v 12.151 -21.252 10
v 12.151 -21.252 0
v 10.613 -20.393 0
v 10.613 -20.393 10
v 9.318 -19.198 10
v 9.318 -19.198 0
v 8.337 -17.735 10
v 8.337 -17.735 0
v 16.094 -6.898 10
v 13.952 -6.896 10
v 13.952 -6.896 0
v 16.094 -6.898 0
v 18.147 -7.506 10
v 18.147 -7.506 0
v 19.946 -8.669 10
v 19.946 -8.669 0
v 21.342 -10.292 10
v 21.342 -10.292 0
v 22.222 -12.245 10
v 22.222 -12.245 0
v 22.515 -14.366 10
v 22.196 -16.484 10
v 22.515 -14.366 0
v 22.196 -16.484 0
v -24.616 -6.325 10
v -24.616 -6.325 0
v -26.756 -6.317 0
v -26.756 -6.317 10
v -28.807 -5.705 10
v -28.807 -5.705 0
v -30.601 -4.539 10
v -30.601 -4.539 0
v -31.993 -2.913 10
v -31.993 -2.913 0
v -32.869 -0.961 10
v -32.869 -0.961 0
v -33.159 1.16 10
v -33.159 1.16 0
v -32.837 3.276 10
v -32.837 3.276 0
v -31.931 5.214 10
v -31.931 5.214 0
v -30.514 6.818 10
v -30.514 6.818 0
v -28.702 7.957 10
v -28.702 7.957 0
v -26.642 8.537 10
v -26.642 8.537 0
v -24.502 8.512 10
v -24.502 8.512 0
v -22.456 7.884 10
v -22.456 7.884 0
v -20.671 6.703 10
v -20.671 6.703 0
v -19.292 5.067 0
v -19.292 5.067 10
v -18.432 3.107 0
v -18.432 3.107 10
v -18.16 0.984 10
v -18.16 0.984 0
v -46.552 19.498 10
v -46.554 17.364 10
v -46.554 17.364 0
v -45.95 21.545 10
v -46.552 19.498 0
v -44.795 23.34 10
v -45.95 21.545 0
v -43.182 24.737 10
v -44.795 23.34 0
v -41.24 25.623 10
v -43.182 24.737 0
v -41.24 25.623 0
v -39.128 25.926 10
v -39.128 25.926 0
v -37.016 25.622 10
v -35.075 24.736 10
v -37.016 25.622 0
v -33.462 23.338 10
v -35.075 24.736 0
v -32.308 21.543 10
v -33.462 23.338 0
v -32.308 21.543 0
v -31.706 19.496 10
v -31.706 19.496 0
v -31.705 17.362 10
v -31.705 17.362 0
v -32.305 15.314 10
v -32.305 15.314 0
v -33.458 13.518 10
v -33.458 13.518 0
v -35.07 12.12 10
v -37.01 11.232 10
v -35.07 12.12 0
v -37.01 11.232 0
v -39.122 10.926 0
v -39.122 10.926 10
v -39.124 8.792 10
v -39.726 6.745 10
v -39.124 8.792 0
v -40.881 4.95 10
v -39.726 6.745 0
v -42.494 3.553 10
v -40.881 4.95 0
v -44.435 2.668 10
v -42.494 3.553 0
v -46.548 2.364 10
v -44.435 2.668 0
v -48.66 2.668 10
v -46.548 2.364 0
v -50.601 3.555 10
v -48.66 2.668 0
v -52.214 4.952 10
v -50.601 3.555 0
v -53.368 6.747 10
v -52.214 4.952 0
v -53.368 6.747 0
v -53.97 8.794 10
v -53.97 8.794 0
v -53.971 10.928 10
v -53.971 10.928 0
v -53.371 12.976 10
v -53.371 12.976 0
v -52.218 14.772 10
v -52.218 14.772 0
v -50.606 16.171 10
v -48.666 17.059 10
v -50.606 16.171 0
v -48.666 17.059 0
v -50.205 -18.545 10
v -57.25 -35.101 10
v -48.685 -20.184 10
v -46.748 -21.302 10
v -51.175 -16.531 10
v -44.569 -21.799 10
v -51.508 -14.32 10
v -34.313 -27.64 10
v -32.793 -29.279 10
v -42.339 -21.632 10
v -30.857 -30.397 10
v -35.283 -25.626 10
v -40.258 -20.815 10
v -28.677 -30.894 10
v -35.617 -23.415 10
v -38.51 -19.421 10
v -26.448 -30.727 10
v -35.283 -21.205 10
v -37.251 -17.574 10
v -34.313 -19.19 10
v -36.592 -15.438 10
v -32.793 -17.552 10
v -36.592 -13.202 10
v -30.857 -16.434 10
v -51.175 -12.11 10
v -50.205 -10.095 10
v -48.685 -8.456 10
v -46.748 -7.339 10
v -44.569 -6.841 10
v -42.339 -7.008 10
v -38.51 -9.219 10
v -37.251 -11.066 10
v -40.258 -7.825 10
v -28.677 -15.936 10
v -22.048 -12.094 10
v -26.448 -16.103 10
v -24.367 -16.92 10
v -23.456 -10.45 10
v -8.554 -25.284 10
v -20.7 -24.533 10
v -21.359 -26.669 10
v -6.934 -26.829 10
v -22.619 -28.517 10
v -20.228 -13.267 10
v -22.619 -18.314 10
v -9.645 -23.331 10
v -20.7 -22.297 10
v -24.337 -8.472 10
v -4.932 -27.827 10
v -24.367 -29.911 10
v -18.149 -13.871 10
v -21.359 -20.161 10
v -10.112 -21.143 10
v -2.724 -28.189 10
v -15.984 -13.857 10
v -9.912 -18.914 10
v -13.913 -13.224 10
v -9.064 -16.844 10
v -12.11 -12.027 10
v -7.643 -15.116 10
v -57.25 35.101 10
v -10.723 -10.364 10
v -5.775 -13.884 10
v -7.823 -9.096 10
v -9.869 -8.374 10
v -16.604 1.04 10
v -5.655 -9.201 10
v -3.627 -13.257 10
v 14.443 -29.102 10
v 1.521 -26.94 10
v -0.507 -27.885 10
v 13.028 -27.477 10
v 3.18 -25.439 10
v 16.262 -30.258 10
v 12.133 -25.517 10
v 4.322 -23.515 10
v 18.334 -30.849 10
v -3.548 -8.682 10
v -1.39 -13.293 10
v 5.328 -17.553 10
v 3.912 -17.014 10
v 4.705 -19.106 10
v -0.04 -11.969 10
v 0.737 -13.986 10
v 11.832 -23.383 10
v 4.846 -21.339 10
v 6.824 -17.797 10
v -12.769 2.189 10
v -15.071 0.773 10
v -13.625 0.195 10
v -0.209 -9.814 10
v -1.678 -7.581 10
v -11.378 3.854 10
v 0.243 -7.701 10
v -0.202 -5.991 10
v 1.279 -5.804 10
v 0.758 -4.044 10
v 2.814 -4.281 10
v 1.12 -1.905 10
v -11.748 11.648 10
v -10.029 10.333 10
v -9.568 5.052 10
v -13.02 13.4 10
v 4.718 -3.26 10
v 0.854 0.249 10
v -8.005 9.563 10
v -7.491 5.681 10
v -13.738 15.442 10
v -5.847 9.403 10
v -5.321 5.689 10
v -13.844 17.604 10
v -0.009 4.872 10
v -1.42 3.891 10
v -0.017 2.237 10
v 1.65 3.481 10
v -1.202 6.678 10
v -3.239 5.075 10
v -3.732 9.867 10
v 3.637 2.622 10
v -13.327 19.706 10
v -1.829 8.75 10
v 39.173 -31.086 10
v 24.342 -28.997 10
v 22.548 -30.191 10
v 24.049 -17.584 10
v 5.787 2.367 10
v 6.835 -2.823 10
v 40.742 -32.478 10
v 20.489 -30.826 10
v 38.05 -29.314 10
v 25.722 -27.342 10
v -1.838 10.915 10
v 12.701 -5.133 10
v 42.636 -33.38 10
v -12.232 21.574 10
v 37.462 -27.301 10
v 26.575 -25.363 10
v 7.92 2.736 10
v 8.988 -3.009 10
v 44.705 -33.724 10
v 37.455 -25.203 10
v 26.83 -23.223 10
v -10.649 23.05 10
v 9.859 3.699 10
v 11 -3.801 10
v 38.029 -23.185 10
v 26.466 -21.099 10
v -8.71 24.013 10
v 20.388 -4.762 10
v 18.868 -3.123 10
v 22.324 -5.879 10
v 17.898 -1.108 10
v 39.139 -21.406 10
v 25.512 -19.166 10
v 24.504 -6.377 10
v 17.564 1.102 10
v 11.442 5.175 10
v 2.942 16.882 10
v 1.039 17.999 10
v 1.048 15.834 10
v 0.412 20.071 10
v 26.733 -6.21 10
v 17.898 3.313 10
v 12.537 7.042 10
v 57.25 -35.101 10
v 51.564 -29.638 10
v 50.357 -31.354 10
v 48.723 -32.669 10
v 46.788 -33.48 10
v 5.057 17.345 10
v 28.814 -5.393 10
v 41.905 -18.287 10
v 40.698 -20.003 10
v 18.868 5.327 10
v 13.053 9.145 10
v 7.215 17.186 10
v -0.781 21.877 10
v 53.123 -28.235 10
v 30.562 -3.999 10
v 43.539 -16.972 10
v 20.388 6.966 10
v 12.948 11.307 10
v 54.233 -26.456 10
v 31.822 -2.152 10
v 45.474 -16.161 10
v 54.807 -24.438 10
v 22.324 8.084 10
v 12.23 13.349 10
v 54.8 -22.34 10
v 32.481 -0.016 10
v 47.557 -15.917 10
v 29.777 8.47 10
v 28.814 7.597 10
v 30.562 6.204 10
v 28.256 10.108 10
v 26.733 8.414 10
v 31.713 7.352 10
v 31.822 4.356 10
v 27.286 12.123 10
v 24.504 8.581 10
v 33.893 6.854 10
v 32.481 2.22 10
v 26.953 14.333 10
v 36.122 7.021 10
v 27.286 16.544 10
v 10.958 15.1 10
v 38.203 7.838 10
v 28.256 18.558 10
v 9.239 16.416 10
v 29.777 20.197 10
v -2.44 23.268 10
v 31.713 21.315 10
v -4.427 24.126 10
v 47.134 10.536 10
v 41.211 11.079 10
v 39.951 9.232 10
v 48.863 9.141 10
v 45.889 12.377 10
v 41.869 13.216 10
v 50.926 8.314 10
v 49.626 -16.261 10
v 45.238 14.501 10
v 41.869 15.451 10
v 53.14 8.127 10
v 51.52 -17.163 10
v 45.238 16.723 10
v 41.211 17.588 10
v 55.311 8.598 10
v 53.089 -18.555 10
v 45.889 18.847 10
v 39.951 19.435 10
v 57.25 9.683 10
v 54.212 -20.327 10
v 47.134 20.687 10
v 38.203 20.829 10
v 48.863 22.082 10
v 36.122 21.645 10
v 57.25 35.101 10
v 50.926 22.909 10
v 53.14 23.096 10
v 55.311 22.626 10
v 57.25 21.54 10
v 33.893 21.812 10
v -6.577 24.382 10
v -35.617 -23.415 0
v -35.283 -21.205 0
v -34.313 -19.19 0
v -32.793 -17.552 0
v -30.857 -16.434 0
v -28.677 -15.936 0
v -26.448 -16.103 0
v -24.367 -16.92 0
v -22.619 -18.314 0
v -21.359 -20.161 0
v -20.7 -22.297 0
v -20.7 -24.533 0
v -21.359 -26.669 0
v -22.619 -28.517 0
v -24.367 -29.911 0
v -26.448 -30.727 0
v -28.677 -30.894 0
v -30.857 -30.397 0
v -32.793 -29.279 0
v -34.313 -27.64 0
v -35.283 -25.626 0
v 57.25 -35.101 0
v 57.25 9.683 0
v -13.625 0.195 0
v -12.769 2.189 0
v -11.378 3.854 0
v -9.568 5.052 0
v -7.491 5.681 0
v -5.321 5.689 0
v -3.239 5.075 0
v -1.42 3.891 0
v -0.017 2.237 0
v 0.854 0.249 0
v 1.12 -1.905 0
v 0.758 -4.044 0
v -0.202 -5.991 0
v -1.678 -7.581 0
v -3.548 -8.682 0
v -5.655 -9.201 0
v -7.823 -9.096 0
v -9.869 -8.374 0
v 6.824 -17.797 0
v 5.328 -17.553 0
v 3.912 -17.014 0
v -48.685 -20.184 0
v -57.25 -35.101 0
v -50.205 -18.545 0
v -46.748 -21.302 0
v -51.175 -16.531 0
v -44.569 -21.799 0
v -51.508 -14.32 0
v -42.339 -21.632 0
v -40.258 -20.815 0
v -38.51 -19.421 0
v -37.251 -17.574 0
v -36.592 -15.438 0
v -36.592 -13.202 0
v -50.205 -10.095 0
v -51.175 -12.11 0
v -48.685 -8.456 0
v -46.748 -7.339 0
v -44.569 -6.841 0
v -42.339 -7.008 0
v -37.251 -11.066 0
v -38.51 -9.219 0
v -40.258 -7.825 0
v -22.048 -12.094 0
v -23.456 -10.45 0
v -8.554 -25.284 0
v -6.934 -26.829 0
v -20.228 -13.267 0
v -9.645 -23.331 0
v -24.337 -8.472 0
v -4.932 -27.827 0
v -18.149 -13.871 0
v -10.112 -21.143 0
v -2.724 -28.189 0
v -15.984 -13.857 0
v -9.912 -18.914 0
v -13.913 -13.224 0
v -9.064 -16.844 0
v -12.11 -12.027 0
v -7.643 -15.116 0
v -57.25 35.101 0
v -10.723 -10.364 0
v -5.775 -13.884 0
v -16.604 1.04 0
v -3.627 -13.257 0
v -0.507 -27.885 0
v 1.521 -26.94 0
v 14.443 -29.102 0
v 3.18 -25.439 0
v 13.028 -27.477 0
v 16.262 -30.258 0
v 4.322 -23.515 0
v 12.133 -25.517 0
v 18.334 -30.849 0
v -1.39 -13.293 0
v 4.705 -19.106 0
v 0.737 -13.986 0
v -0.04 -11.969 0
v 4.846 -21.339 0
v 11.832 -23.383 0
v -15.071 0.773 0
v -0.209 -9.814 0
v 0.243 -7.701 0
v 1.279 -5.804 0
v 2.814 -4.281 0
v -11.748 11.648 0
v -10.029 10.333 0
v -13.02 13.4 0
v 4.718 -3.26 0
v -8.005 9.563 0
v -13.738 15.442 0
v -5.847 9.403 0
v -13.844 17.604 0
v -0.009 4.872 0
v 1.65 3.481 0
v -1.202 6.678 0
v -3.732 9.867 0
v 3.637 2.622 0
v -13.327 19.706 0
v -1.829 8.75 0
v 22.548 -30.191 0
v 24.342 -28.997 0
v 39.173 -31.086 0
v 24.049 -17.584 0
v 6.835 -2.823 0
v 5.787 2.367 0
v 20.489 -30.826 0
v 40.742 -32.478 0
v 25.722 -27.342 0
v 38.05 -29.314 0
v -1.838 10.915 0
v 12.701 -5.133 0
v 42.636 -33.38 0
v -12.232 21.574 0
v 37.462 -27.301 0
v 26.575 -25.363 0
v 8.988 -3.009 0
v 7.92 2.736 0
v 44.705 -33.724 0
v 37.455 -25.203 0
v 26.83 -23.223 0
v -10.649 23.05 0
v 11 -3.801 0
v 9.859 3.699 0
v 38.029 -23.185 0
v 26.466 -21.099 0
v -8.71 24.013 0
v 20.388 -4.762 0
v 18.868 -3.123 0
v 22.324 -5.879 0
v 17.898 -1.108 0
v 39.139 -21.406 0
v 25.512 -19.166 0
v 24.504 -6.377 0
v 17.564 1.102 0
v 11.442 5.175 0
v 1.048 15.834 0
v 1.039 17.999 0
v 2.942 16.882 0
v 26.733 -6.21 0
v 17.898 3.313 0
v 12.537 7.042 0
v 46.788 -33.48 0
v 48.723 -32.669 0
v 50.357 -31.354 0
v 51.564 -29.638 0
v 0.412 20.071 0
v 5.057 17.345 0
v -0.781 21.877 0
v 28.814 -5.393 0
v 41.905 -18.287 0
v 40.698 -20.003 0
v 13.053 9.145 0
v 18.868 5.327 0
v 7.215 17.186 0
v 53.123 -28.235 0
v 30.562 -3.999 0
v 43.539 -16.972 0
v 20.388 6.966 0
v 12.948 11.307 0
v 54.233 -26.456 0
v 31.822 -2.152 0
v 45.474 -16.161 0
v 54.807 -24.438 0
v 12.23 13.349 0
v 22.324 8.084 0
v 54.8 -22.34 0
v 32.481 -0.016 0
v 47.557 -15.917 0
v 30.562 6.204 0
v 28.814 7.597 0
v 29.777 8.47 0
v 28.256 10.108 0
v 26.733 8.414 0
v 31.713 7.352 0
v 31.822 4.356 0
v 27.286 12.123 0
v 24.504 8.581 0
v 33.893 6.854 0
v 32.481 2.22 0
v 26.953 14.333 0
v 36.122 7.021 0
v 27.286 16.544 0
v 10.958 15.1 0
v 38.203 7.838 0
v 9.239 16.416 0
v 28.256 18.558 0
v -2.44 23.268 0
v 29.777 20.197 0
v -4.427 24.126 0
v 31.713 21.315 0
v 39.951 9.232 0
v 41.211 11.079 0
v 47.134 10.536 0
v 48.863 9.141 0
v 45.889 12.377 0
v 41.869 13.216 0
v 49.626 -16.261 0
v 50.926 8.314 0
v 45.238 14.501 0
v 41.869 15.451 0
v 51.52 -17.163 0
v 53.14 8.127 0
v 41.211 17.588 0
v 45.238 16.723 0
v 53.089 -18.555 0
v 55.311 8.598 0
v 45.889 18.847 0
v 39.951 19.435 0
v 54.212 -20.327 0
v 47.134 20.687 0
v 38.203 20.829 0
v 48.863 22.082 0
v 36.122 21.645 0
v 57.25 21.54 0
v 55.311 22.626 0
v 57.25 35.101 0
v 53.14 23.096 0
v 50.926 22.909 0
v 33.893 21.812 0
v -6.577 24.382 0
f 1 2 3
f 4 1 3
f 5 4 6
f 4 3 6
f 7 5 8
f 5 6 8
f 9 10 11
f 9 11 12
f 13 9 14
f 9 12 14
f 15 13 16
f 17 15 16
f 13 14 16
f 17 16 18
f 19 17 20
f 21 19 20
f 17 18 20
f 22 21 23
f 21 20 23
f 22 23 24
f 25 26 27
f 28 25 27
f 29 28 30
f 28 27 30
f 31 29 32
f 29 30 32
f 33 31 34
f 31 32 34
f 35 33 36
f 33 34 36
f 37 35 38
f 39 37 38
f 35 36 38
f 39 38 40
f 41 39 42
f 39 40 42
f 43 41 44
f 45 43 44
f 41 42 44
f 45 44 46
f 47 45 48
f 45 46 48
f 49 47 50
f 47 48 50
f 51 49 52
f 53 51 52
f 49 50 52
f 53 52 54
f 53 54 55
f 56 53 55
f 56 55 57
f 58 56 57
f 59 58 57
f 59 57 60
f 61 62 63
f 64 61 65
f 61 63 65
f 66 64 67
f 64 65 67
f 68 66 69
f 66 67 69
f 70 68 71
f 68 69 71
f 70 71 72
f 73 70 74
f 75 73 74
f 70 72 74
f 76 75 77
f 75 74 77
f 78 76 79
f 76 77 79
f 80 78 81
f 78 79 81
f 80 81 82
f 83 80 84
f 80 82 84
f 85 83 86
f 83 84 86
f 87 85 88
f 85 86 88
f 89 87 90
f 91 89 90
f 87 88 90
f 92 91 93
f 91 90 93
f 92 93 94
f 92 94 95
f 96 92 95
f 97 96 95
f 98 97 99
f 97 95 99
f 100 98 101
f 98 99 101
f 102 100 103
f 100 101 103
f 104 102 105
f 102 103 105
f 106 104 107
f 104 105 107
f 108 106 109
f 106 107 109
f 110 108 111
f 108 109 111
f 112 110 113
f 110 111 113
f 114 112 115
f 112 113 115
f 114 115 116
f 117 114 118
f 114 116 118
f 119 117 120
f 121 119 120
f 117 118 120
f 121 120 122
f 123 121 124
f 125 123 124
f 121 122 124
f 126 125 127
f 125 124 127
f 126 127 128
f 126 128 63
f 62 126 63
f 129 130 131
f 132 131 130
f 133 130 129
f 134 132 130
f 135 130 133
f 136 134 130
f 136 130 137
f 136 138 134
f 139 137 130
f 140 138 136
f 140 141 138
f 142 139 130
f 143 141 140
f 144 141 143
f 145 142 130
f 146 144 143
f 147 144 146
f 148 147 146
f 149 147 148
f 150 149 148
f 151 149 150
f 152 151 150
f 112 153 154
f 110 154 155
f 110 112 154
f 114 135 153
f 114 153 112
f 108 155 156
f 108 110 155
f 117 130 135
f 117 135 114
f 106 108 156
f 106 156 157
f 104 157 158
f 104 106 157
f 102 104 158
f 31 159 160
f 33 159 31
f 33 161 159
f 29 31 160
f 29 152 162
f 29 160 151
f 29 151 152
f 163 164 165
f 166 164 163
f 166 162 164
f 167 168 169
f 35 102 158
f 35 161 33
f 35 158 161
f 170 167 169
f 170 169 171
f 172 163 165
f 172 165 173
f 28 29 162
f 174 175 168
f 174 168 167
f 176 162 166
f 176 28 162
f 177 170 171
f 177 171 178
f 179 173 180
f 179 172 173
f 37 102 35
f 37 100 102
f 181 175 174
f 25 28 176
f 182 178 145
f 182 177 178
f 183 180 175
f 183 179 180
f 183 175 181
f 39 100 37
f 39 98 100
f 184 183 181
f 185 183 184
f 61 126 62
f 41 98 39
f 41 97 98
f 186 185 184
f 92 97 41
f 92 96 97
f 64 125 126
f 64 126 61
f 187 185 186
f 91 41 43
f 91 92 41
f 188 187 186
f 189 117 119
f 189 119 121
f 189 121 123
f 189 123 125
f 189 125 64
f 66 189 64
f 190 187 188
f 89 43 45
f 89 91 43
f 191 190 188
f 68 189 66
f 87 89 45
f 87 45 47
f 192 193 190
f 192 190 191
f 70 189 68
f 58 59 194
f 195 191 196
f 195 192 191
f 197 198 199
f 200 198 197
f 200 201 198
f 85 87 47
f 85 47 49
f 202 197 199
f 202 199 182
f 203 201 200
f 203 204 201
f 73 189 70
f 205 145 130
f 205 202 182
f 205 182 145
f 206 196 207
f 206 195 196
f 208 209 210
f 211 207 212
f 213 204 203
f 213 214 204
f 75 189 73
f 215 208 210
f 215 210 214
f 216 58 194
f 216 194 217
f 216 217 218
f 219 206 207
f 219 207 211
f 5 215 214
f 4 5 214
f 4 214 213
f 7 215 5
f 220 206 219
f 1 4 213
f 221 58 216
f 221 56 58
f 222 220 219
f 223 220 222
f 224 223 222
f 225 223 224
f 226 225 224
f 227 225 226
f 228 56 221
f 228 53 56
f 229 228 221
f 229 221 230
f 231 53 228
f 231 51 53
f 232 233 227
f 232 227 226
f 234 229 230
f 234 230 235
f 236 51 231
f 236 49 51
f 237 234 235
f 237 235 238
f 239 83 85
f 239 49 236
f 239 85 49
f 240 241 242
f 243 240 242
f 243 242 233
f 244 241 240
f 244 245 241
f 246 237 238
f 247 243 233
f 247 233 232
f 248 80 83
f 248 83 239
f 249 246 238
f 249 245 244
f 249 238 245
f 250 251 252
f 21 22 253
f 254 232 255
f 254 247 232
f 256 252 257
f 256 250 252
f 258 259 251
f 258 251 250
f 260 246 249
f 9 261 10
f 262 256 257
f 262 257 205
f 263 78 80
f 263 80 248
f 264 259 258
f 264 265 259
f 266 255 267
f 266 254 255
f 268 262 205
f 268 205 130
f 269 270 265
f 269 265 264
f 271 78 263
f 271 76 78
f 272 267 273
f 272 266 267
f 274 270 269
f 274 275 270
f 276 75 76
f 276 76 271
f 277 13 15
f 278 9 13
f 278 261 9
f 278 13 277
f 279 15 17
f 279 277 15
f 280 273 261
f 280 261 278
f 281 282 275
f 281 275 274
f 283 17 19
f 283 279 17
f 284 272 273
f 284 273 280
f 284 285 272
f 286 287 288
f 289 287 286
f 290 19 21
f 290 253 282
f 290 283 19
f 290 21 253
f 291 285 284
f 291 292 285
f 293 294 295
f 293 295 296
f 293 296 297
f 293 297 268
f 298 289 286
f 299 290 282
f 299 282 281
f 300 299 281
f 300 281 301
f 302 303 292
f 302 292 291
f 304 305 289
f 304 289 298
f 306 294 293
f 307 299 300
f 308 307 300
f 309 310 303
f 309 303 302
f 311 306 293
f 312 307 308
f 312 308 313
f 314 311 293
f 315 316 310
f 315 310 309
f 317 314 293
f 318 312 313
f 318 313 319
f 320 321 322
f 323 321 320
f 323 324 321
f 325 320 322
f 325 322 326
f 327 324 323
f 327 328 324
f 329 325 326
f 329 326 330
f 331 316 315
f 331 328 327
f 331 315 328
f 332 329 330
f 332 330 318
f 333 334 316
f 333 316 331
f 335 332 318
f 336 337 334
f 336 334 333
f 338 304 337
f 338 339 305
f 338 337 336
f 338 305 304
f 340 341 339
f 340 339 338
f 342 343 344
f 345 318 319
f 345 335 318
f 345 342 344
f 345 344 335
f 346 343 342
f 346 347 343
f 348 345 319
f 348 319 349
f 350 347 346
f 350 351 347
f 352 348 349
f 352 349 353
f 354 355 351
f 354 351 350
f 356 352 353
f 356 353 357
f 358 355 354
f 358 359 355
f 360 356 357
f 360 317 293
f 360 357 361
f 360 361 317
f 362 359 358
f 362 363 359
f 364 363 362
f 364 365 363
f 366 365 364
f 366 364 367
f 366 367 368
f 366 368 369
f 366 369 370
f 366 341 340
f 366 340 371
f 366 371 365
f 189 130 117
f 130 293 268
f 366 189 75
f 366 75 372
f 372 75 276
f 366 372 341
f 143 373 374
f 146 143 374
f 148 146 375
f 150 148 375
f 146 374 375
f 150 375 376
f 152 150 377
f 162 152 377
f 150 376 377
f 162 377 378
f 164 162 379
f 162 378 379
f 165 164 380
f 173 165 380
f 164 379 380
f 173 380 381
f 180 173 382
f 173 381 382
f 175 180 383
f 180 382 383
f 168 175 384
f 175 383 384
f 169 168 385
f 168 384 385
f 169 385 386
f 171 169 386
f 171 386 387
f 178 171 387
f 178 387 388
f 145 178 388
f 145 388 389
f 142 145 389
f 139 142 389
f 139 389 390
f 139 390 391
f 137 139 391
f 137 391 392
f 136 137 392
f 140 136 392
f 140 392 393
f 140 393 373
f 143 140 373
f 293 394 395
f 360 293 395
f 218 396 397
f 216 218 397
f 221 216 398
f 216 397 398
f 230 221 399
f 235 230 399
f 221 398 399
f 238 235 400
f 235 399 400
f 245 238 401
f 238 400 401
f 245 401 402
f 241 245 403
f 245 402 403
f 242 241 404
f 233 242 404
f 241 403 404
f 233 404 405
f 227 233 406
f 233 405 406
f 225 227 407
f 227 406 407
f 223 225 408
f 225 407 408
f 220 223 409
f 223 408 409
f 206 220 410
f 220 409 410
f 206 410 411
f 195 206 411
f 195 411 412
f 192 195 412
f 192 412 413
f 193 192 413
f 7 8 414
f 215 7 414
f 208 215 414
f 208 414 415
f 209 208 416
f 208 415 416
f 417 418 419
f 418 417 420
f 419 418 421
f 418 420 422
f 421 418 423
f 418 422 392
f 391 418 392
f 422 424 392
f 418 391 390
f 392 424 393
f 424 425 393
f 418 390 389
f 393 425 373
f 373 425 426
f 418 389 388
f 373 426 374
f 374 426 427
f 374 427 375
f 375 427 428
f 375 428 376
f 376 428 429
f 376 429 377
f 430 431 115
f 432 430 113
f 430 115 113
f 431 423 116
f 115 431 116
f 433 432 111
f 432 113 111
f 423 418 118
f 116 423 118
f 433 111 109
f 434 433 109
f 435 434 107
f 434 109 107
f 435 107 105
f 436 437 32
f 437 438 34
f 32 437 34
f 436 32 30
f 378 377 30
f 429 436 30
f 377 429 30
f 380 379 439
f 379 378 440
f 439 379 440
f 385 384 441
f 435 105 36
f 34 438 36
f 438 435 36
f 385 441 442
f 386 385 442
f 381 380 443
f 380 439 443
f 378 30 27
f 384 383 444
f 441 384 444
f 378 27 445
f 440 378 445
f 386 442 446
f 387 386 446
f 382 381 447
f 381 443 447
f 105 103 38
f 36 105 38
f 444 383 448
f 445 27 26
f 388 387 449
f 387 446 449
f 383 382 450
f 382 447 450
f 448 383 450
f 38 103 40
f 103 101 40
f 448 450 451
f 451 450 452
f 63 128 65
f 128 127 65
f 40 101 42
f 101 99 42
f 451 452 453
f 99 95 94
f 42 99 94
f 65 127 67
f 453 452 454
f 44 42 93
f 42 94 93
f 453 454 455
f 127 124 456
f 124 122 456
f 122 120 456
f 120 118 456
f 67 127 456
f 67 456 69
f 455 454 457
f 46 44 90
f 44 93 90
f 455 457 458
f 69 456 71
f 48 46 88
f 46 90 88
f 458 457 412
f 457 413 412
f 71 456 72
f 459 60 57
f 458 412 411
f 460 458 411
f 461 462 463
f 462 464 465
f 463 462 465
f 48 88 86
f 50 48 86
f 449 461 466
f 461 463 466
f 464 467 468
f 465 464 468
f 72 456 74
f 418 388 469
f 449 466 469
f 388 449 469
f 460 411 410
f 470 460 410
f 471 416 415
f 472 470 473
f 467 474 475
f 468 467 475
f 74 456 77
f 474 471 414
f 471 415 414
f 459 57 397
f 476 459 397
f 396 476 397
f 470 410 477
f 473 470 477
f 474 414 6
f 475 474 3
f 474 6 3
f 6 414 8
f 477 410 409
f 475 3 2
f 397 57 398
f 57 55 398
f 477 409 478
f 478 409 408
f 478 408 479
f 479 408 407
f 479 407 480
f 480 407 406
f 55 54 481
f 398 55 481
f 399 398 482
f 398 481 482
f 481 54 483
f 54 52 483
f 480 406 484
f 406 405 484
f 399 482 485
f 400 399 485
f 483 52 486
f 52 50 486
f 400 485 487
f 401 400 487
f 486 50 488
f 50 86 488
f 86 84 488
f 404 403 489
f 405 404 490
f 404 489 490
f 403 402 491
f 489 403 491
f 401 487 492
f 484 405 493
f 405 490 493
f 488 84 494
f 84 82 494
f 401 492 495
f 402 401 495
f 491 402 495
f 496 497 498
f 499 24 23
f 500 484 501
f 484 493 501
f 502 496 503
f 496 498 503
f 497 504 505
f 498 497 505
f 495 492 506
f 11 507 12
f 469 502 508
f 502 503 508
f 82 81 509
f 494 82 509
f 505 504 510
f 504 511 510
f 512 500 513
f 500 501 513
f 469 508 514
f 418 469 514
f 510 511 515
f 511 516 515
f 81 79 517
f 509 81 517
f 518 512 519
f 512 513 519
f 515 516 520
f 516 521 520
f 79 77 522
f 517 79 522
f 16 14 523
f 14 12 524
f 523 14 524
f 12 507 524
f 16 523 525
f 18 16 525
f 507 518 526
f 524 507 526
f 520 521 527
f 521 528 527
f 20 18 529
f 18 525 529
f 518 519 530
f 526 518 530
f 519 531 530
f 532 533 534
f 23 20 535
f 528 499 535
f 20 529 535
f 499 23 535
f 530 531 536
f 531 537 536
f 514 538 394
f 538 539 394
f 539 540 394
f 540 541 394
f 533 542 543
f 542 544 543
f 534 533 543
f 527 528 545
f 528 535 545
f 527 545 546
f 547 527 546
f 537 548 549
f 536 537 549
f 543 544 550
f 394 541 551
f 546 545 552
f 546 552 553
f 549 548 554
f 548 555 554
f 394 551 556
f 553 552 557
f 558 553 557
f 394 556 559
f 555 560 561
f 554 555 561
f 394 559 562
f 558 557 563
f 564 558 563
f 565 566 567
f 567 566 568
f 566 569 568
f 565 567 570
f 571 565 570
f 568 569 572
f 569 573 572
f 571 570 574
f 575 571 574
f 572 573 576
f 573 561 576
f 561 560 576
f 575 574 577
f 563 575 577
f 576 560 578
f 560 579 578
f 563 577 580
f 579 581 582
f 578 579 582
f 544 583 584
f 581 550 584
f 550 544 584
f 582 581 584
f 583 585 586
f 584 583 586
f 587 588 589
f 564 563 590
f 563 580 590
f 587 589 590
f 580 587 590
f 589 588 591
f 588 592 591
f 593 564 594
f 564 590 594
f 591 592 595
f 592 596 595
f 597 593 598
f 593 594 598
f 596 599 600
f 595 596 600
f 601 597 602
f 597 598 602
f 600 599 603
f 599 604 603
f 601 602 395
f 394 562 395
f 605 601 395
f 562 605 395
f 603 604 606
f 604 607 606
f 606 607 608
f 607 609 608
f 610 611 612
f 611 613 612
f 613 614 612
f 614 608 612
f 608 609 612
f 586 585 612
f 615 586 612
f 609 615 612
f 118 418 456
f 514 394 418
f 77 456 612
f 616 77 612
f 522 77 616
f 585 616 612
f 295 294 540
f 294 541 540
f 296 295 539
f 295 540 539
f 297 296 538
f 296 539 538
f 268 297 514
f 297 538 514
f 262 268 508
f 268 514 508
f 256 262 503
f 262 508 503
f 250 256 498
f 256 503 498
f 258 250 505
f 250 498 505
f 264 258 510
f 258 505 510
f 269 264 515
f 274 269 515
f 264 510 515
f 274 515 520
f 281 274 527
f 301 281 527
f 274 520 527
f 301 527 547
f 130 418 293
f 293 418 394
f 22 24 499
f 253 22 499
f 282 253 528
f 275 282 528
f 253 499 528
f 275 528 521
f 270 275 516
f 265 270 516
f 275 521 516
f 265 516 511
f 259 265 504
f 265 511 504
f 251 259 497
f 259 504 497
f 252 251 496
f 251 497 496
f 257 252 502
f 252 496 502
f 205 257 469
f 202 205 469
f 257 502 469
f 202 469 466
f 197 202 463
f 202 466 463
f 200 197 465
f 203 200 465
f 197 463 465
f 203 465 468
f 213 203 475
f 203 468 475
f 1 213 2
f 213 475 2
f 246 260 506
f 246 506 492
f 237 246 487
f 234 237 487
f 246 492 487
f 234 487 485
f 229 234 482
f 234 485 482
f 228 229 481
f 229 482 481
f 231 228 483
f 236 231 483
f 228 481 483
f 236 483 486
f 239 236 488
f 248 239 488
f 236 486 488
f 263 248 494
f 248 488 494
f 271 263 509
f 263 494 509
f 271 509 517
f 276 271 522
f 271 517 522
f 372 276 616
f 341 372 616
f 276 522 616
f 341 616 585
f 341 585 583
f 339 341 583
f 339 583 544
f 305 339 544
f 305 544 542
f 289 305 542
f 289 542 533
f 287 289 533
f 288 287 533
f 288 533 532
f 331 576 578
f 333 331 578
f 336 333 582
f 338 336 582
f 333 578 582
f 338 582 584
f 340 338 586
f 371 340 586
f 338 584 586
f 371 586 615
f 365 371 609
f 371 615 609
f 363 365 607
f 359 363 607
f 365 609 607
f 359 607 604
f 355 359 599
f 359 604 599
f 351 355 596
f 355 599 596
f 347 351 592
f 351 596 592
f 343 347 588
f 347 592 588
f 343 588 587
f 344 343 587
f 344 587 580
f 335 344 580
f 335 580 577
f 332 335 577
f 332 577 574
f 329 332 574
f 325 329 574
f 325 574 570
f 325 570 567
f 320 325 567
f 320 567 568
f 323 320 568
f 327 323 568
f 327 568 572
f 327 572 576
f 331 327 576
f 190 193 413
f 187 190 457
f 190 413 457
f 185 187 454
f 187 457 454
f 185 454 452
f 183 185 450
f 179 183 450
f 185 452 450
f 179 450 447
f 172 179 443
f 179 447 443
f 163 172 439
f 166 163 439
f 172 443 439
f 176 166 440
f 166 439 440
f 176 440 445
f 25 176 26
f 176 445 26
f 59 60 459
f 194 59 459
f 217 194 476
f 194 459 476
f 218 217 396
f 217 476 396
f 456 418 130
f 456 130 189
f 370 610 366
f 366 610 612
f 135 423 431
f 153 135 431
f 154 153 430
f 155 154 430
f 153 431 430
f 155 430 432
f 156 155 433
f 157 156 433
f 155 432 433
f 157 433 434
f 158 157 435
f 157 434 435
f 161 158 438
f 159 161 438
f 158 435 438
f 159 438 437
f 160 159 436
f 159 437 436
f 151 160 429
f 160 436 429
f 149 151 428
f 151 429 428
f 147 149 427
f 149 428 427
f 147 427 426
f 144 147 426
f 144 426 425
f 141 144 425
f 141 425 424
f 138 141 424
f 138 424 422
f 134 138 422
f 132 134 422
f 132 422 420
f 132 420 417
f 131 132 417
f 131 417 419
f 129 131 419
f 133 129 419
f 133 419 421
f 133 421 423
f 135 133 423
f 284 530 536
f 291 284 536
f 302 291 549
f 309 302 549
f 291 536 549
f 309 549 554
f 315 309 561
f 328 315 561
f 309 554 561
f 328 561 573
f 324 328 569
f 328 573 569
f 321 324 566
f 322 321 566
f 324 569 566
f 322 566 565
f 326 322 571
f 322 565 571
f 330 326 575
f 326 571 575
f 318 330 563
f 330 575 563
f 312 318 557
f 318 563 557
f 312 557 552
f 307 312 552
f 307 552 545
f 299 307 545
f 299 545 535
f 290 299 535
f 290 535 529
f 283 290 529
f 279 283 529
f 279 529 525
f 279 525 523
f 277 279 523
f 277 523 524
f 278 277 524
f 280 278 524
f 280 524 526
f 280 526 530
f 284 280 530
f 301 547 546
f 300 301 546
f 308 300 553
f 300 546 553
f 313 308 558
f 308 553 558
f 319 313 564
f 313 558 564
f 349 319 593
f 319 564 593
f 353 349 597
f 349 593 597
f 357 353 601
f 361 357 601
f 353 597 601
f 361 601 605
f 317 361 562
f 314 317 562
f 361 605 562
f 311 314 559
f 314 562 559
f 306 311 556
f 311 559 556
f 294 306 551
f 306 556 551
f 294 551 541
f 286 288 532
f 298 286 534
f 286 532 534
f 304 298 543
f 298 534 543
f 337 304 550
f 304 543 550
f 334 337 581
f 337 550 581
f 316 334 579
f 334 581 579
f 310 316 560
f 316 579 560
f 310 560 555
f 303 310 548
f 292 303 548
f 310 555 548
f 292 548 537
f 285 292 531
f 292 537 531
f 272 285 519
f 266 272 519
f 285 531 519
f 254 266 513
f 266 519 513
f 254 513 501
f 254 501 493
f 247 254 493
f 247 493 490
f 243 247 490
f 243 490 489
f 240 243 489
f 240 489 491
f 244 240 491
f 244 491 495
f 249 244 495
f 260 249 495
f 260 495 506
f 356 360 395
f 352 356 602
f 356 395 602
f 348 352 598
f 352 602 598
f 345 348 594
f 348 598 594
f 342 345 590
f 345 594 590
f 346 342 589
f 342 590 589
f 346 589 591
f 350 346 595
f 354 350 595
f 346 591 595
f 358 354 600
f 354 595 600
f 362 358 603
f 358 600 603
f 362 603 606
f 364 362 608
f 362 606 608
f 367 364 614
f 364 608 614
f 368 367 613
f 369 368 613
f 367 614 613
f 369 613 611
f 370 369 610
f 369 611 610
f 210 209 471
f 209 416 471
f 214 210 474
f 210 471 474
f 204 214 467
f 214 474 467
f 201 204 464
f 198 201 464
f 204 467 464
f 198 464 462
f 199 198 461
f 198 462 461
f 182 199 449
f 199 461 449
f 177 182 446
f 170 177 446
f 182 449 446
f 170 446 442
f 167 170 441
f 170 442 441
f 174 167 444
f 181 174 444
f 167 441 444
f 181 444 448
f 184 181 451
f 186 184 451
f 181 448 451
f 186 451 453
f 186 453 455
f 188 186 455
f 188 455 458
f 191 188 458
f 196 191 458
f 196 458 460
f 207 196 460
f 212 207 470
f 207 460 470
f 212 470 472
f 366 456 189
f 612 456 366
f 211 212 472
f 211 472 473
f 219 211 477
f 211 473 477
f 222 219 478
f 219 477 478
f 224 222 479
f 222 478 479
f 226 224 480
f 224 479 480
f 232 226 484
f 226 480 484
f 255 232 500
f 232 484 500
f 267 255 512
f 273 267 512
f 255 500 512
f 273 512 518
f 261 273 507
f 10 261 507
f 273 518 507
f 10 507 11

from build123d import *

# Parameters (mm, degrees)
SKICA1_W                 = 114.49904762
SKICA1_H                 = 70.201904762
P_IDAT_VYSUNUT_M1_DEPTH  = 10
ODEBRAT_VYSUNUT_M1_REACH = 69.894
SKICA2_R                 = 7.5


with BuildPart() as part:
    # Skica1 → Přidat vysunutím1 (new body)
    with BuildSketch(Plane.XY):
        Rectangle(SKICA1_W, SKICA1_H)
    extrude(amount=P_IDAT_VYSUNUT_M1_DEPTH)

    # Skica2 → Odebrat vysunutím1 (cut, up to next)
    with BuildSketch(Plane(origin=(0, 0, 0), x_dir=(-1, 0, 0), z_dir=(0, 0, -1)), mode=Mode.PRIVATE) as odebrat_vysunut_m1_sk1:
        with Locations((-44.884870965, -26.225697914)):
            Circle(SKICA2_R)
    odebrat_vysunut_m1_tool1 = extrude(odebrat_vysunut_m1_sk1.sketch, amount=-ODEBRAT_VYSUNUT_M1_REACH, mode=Mode.PRIVATE) & part.part
    odebrat_vysunut_m1 = odebrat_vysunut_m1_tool1.solids().sort_by_distance((44.884871, -26.225698, 0))[0]
    add(odebrat_vysunut_m1, mode=Mode.SUBTRACT)

    # Skica-pole1: Odebrat vysunutím1 at 17 more places
    with Locations((-10.431632, 40.559072, 0), (-47.510307, 5.535631, 0), (-91.431484, 36.089944, 0), (-19.820495, 27.327921, 0), (-29.869712, 11.905495, 0), (-39.296811, 36.089944, 0), (-51.262991, 43.110266, 0), (-73.00145, 2.810383, 0), (-62.00138, 19.782901, 0), (-70.543611, 27.327921, 0), (-51.262991, 24.48943, 0), (-37.6102, 15.915325, 0), (2.492308, 2.810383, 0), (7.770749, 41.83746, 0), (-25.552545, 2.810383, 0), (-88.893218, 11.905495, 0), (-84.014078, 44.651823, 0)):
        add(odebrat_vysunut_m1, mode=Mode.SUBTRACT)


solid = part.part
